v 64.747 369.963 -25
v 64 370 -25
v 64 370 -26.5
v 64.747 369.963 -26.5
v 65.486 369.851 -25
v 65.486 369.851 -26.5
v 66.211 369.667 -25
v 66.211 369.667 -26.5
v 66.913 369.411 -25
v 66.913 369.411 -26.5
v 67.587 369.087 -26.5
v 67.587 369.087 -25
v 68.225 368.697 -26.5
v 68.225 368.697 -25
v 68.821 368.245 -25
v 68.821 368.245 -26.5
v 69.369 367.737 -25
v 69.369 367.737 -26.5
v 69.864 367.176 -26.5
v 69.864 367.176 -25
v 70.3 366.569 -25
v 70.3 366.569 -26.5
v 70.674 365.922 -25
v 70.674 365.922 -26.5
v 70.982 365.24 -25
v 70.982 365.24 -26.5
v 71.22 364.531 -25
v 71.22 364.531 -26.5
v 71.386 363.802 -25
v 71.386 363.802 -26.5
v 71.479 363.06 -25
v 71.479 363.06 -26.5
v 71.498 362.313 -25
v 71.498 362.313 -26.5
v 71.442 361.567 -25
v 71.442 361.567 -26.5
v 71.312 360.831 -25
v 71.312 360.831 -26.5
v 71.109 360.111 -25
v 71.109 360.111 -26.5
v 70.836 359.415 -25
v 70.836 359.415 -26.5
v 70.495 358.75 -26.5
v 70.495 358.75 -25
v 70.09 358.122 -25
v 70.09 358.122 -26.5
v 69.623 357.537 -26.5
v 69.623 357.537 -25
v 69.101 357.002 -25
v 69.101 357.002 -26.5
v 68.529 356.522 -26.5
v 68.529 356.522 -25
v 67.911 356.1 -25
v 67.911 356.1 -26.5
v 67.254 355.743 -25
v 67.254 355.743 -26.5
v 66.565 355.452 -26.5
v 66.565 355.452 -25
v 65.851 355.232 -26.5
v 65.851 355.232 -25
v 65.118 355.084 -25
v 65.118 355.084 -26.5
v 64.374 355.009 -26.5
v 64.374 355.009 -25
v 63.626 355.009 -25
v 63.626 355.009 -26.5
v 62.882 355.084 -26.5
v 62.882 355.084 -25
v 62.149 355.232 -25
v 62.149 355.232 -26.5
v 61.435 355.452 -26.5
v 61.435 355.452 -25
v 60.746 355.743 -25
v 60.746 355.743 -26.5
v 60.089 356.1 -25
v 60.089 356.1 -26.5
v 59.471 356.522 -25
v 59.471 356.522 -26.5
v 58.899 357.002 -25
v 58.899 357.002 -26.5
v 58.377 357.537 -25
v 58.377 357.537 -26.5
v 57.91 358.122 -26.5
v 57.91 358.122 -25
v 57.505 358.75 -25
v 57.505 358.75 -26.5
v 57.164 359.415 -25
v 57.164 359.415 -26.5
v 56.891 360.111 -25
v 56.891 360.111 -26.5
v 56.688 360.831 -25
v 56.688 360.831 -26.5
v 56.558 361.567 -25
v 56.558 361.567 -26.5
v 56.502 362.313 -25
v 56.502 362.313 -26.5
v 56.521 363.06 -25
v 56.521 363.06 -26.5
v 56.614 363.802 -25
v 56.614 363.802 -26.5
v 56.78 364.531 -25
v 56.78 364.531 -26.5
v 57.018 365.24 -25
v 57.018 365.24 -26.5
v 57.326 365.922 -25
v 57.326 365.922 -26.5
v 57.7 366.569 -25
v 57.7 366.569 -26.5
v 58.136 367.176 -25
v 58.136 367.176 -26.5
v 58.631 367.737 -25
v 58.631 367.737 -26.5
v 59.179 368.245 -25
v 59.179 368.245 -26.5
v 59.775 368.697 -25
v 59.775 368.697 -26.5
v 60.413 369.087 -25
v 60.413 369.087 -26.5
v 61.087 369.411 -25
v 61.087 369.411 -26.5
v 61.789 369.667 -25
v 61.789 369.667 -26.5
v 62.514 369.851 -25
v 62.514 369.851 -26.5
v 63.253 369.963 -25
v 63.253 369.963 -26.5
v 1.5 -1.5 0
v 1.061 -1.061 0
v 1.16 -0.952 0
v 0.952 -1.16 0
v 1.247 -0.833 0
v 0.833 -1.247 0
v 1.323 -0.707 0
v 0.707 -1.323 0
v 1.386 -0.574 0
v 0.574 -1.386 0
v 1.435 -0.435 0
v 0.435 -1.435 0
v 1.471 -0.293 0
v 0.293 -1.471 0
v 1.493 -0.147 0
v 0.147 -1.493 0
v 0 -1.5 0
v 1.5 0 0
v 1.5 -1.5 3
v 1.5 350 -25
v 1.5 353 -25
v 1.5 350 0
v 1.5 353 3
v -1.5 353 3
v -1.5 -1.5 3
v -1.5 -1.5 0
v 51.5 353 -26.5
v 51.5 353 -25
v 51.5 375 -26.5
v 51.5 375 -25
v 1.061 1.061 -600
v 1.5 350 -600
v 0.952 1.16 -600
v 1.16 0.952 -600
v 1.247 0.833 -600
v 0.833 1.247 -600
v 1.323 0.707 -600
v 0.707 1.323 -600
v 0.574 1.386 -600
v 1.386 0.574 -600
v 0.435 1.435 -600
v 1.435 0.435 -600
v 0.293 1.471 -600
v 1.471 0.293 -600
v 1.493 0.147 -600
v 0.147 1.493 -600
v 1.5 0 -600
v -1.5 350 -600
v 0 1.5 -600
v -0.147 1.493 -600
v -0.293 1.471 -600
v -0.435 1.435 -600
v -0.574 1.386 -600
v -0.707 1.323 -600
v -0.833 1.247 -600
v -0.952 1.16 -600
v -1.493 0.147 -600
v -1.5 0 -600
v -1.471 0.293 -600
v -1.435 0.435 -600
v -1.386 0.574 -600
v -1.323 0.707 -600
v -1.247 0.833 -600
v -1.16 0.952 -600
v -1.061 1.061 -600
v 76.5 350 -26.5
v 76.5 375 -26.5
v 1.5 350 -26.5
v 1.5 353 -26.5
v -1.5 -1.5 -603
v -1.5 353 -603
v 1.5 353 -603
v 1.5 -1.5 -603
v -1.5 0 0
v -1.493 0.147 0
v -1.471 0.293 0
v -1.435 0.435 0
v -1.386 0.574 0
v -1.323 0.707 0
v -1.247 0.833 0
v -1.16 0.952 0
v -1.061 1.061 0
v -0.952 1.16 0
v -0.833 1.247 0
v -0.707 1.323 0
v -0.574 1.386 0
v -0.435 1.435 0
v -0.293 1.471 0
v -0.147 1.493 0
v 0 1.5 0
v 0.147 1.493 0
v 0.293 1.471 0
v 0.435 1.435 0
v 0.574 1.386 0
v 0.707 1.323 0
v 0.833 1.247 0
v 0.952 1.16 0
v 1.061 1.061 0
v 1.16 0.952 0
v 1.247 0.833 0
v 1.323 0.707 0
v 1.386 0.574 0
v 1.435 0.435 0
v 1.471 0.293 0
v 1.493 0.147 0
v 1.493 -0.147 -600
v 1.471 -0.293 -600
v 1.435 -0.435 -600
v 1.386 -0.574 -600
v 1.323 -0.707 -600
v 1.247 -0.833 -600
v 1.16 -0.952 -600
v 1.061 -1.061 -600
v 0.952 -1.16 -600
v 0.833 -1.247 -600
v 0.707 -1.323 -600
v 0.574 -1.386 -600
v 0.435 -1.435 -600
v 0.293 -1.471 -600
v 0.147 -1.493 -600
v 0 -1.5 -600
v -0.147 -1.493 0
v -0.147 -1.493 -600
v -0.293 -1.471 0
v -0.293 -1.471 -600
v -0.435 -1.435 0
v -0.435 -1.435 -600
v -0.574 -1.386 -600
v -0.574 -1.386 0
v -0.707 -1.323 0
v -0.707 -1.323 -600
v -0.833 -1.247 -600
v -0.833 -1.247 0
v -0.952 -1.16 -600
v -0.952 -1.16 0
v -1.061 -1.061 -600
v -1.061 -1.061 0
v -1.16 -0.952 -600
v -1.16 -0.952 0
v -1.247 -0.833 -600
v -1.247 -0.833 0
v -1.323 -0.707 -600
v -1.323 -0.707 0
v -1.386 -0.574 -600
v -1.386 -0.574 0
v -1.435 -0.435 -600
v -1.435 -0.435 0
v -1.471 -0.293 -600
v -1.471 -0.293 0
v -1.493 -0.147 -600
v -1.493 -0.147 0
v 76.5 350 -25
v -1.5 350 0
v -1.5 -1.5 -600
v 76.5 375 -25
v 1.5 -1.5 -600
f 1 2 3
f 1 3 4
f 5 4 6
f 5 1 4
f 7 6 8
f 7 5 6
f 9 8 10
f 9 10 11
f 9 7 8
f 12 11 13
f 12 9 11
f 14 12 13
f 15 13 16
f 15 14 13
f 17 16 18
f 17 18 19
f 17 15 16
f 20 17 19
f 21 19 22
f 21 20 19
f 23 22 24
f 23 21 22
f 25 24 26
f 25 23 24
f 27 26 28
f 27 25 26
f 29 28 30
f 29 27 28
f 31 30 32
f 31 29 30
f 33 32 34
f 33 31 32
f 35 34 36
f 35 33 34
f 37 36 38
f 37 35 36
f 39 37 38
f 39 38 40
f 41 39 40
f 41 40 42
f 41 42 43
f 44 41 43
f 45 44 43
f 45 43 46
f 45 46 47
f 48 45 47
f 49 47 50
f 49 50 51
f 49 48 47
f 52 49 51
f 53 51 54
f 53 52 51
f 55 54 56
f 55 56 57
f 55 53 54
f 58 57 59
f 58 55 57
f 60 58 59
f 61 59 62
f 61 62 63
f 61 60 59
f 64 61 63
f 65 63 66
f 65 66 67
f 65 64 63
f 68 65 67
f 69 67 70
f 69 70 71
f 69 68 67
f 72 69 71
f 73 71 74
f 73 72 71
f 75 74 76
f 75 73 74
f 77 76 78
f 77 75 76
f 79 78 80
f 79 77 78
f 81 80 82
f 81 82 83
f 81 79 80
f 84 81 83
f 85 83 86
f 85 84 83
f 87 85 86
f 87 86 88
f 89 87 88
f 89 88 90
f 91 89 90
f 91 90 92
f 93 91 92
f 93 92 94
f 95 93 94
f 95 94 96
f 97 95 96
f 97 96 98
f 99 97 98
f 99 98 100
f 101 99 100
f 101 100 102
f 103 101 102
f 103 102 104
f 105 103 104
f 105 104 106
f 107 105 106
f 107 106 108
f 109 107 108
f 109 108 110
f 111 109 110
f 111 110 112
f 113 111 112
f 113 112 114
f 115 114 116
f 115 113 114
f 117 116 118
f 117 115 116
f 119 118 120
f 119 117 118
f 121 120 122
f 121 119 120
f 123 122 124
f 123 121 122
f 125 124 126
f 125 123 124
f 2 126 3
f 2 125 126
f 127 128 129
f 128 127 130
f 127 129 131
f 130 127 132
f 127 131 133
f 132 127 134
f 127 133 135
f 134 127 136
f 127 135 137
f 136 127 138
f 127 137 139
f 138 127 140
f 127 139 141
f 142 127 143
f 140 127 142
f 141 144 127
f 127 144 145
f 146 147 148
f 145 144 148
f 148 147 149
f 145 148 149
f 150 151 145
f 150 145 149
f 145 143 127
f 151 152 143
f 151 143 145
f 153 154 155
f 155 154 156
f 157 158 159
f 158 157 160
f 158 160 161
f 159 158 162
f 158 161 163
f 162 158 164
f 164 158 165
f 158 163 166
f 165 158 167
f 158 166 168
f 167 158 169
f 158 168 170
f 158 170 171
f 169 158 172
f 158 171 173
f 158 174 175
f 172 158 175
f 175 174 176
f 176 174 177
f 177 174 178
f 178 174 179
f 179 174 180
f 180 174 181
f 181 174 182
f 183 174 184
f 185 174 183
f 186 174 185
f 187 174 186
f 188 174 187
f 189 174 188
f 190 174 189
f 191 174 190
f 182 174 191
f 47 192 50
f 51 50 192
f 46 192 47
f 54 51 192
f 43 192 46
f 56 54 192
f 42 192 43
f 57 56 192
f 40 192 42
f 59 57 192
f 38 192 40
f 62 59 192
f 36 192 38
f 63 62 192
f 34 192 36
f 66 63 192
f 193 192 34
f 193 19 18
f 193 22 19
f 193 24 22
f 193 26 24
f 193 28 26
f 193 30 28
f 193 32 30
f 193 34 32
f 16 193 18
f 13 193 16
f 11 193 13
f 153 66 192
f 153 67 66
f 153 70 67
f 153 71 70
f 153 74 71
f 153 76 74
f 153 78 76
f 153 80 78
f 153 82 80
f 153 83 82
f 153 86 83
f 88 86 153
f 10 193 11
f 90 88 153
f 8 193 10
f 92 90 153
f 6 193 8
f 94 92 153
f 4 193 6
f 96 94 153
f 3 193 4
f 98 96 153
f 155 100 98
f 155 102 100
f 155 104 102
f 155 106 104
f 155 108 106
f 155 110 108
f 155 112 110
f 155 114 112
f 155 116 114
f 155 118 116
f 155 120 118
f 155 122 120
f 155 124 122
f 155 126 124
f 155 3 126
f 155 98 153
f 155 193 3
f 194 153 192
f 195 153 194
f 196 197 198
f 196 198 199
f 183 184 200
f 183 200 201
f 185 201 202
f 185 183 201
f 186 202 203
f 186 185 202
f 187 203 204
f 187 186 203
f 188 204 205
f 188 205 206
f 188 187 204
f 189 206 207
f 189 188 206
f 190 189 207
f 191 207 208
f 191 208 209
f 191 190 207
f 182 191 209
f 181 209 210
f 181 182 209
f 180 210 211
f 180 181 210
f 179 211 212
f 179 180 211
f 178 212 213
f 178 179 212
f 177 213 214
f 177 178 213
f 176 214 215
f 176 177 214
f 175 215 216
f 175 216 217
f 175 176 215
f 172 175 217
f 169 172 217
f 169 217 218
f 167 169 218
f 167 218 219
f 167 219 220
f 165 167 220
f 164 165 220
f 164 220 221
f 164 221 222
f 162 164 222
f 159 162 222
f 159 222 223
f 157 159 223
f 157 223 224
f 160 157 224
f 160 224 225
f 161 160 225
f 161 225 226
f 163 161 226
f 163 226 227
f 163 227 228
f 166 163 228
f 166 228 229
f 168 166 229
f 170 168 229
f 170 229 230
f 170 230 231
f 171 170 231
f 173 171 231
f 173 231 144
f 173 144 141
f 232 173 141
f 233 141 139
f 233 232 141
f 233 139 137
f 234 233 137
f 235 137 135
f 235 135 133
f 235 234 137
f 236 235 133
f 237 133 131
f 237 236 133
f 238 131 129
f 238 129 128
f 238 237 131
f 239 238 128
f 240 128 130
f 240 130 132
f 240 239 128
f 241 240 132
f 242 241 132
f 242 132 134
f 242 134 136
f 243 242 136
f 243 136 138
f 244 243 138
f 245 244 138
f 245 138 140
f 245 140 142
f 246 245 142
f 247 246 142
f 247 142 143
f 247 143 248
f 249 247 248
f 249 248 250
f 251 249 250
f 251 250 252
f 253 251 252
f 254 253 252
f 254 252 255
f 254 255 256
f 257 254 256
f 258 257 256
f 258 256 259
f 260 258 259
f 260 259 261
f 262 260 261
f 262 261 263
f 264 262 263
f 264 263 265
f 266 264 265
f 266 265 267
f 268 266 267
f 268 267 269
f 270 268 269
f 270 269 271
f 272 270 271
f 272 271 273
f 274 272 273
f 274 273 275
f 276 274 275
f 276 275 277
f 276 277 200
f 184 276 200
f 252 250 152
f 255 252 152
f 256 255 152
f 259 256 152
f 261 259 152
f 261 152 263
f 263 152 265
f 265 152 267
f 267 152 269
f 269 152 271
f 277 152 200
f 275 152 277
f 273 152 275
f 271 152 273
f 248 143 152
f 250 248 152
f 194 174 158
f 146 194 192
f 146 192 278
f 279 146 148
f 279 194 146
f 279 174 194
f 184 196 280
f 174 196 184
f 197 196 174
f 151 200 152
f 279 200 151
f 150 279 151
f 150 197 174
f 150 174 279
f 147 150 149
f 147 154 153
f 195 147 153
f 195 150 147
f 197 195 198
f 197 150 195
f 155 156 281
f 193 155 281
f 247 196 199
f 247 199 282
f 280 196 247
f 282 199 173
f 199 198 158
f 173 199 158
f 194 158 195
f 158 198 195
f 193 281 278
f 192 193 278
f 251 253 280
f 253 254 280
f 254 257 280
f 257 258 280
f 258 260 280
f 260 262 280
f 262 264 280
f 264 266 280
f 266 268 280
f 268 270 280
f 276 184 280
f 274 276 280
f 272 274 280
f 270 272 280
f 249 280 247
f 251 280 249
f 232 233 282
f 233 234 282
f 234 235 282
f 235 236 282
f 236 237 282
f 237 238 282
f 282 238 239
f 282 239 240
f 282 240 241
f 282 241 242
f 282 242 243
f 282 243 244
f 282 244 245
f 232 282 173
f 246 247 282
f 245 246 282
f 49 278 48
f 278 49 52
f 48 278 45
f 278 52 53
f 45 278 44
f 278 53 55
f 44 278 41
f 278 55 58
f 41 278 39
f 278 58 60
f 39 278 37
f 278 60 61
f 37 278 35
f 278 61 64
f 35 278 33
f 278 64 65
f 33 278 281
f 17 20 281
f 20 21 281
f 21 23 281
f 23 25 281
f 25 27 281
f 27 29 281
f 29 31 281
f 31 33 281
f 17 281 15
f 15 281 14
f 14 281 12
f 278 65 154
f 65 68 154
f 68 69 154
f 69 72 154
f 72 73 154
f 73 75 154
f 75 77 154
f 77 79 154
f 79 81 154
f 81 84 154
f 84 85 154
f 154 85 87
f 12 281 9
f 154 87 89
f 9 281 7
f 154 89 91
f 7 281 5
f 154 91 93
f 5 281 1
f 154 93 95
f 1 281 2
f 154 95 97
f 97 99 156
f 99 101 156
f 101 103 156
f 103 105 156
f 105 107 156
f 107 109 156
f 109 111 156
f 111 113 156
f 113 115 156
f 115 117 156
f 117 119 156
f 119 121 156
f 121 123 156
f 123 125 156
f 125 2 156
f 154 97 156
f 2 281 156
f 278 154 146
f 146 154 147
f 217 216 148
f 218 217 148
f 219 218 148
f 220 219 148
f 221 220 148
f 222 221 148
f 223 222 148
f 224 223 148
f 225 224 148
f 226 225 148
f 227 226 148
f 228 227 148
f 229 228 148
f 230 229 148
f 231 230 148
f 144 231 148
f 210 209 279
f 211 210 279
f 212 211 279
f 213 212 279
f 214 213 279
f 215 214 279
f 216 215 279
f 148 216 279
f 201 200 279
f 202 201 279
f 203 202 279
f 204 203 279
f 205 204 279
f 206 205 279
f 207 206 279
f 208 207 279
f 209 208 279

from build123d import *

# Parameters (mm, degrees)
SKETCH2_R                = 1.5
BOSS_EXTRUDE1_DEPTH      = 600
BOSS_EXTRUDE2_DEPTH      = 1.5
BOSS_EXTRUDE2_DEPTH_BACK = 1.5
SKETCH3_R                = 7.5
BOSS_EXTRUDE3_DEPTH      = 1.5


with BuildPart() as part:
    # Sketch2 → Boss-Extrude1 (new body)
    with BuildSketch(Plane(origin=(0, 0, -600), x_dir=(-1, 0, 0), z_dir=(0, 0, -1))):
        Circle(SKETCH2_R)
    extrude(amount=-BOSS_EXTRUDE1_DEPTH)

    # Sketch1 → Boss-Extrude2 (add, two sides: drawn at the far end of the back side and taken through both)
    with BuildSketch(Plane(origin=(0, 0, 0), x_dir=(0, 0, -1), z_dir=(1, 0, 0)).offset(-BOSS_EXTRUDE2_DEPTH_BACK)):
        Polygon((0, 0), (0, -1.5), (-3, -1.5), (-3, 353), (603, 353), (603, -1.5), (600, -1.5), (600, 0), (600, 350), (0, 350), align=None)
    extrude(amount=BOSS_EXTRUDE2_DEPTH + BOSS_EXTRUDE2_DEPTH_BACK)

    # Sketch3 → Boss-Extrude3 (add)
    with BuildSketch(Plane(origin=(0, 0, -25), x_dir=(-1, 0, 0), z_dir=(0, 0, -1))):
        Polygon((-1.5, 350), (-1.5, 353), (-51.5, 353), (-51.5, 375), (-76.5, 375), (-76.5, 350), align=None)
        with Locations((-64, 362.5)):
            Circle(SKETCH3_R, mode=Mode.SUBTRACT)
    extrude(amount=BOSS_EXTRUDE3_DEPTH)


solid = part.part
